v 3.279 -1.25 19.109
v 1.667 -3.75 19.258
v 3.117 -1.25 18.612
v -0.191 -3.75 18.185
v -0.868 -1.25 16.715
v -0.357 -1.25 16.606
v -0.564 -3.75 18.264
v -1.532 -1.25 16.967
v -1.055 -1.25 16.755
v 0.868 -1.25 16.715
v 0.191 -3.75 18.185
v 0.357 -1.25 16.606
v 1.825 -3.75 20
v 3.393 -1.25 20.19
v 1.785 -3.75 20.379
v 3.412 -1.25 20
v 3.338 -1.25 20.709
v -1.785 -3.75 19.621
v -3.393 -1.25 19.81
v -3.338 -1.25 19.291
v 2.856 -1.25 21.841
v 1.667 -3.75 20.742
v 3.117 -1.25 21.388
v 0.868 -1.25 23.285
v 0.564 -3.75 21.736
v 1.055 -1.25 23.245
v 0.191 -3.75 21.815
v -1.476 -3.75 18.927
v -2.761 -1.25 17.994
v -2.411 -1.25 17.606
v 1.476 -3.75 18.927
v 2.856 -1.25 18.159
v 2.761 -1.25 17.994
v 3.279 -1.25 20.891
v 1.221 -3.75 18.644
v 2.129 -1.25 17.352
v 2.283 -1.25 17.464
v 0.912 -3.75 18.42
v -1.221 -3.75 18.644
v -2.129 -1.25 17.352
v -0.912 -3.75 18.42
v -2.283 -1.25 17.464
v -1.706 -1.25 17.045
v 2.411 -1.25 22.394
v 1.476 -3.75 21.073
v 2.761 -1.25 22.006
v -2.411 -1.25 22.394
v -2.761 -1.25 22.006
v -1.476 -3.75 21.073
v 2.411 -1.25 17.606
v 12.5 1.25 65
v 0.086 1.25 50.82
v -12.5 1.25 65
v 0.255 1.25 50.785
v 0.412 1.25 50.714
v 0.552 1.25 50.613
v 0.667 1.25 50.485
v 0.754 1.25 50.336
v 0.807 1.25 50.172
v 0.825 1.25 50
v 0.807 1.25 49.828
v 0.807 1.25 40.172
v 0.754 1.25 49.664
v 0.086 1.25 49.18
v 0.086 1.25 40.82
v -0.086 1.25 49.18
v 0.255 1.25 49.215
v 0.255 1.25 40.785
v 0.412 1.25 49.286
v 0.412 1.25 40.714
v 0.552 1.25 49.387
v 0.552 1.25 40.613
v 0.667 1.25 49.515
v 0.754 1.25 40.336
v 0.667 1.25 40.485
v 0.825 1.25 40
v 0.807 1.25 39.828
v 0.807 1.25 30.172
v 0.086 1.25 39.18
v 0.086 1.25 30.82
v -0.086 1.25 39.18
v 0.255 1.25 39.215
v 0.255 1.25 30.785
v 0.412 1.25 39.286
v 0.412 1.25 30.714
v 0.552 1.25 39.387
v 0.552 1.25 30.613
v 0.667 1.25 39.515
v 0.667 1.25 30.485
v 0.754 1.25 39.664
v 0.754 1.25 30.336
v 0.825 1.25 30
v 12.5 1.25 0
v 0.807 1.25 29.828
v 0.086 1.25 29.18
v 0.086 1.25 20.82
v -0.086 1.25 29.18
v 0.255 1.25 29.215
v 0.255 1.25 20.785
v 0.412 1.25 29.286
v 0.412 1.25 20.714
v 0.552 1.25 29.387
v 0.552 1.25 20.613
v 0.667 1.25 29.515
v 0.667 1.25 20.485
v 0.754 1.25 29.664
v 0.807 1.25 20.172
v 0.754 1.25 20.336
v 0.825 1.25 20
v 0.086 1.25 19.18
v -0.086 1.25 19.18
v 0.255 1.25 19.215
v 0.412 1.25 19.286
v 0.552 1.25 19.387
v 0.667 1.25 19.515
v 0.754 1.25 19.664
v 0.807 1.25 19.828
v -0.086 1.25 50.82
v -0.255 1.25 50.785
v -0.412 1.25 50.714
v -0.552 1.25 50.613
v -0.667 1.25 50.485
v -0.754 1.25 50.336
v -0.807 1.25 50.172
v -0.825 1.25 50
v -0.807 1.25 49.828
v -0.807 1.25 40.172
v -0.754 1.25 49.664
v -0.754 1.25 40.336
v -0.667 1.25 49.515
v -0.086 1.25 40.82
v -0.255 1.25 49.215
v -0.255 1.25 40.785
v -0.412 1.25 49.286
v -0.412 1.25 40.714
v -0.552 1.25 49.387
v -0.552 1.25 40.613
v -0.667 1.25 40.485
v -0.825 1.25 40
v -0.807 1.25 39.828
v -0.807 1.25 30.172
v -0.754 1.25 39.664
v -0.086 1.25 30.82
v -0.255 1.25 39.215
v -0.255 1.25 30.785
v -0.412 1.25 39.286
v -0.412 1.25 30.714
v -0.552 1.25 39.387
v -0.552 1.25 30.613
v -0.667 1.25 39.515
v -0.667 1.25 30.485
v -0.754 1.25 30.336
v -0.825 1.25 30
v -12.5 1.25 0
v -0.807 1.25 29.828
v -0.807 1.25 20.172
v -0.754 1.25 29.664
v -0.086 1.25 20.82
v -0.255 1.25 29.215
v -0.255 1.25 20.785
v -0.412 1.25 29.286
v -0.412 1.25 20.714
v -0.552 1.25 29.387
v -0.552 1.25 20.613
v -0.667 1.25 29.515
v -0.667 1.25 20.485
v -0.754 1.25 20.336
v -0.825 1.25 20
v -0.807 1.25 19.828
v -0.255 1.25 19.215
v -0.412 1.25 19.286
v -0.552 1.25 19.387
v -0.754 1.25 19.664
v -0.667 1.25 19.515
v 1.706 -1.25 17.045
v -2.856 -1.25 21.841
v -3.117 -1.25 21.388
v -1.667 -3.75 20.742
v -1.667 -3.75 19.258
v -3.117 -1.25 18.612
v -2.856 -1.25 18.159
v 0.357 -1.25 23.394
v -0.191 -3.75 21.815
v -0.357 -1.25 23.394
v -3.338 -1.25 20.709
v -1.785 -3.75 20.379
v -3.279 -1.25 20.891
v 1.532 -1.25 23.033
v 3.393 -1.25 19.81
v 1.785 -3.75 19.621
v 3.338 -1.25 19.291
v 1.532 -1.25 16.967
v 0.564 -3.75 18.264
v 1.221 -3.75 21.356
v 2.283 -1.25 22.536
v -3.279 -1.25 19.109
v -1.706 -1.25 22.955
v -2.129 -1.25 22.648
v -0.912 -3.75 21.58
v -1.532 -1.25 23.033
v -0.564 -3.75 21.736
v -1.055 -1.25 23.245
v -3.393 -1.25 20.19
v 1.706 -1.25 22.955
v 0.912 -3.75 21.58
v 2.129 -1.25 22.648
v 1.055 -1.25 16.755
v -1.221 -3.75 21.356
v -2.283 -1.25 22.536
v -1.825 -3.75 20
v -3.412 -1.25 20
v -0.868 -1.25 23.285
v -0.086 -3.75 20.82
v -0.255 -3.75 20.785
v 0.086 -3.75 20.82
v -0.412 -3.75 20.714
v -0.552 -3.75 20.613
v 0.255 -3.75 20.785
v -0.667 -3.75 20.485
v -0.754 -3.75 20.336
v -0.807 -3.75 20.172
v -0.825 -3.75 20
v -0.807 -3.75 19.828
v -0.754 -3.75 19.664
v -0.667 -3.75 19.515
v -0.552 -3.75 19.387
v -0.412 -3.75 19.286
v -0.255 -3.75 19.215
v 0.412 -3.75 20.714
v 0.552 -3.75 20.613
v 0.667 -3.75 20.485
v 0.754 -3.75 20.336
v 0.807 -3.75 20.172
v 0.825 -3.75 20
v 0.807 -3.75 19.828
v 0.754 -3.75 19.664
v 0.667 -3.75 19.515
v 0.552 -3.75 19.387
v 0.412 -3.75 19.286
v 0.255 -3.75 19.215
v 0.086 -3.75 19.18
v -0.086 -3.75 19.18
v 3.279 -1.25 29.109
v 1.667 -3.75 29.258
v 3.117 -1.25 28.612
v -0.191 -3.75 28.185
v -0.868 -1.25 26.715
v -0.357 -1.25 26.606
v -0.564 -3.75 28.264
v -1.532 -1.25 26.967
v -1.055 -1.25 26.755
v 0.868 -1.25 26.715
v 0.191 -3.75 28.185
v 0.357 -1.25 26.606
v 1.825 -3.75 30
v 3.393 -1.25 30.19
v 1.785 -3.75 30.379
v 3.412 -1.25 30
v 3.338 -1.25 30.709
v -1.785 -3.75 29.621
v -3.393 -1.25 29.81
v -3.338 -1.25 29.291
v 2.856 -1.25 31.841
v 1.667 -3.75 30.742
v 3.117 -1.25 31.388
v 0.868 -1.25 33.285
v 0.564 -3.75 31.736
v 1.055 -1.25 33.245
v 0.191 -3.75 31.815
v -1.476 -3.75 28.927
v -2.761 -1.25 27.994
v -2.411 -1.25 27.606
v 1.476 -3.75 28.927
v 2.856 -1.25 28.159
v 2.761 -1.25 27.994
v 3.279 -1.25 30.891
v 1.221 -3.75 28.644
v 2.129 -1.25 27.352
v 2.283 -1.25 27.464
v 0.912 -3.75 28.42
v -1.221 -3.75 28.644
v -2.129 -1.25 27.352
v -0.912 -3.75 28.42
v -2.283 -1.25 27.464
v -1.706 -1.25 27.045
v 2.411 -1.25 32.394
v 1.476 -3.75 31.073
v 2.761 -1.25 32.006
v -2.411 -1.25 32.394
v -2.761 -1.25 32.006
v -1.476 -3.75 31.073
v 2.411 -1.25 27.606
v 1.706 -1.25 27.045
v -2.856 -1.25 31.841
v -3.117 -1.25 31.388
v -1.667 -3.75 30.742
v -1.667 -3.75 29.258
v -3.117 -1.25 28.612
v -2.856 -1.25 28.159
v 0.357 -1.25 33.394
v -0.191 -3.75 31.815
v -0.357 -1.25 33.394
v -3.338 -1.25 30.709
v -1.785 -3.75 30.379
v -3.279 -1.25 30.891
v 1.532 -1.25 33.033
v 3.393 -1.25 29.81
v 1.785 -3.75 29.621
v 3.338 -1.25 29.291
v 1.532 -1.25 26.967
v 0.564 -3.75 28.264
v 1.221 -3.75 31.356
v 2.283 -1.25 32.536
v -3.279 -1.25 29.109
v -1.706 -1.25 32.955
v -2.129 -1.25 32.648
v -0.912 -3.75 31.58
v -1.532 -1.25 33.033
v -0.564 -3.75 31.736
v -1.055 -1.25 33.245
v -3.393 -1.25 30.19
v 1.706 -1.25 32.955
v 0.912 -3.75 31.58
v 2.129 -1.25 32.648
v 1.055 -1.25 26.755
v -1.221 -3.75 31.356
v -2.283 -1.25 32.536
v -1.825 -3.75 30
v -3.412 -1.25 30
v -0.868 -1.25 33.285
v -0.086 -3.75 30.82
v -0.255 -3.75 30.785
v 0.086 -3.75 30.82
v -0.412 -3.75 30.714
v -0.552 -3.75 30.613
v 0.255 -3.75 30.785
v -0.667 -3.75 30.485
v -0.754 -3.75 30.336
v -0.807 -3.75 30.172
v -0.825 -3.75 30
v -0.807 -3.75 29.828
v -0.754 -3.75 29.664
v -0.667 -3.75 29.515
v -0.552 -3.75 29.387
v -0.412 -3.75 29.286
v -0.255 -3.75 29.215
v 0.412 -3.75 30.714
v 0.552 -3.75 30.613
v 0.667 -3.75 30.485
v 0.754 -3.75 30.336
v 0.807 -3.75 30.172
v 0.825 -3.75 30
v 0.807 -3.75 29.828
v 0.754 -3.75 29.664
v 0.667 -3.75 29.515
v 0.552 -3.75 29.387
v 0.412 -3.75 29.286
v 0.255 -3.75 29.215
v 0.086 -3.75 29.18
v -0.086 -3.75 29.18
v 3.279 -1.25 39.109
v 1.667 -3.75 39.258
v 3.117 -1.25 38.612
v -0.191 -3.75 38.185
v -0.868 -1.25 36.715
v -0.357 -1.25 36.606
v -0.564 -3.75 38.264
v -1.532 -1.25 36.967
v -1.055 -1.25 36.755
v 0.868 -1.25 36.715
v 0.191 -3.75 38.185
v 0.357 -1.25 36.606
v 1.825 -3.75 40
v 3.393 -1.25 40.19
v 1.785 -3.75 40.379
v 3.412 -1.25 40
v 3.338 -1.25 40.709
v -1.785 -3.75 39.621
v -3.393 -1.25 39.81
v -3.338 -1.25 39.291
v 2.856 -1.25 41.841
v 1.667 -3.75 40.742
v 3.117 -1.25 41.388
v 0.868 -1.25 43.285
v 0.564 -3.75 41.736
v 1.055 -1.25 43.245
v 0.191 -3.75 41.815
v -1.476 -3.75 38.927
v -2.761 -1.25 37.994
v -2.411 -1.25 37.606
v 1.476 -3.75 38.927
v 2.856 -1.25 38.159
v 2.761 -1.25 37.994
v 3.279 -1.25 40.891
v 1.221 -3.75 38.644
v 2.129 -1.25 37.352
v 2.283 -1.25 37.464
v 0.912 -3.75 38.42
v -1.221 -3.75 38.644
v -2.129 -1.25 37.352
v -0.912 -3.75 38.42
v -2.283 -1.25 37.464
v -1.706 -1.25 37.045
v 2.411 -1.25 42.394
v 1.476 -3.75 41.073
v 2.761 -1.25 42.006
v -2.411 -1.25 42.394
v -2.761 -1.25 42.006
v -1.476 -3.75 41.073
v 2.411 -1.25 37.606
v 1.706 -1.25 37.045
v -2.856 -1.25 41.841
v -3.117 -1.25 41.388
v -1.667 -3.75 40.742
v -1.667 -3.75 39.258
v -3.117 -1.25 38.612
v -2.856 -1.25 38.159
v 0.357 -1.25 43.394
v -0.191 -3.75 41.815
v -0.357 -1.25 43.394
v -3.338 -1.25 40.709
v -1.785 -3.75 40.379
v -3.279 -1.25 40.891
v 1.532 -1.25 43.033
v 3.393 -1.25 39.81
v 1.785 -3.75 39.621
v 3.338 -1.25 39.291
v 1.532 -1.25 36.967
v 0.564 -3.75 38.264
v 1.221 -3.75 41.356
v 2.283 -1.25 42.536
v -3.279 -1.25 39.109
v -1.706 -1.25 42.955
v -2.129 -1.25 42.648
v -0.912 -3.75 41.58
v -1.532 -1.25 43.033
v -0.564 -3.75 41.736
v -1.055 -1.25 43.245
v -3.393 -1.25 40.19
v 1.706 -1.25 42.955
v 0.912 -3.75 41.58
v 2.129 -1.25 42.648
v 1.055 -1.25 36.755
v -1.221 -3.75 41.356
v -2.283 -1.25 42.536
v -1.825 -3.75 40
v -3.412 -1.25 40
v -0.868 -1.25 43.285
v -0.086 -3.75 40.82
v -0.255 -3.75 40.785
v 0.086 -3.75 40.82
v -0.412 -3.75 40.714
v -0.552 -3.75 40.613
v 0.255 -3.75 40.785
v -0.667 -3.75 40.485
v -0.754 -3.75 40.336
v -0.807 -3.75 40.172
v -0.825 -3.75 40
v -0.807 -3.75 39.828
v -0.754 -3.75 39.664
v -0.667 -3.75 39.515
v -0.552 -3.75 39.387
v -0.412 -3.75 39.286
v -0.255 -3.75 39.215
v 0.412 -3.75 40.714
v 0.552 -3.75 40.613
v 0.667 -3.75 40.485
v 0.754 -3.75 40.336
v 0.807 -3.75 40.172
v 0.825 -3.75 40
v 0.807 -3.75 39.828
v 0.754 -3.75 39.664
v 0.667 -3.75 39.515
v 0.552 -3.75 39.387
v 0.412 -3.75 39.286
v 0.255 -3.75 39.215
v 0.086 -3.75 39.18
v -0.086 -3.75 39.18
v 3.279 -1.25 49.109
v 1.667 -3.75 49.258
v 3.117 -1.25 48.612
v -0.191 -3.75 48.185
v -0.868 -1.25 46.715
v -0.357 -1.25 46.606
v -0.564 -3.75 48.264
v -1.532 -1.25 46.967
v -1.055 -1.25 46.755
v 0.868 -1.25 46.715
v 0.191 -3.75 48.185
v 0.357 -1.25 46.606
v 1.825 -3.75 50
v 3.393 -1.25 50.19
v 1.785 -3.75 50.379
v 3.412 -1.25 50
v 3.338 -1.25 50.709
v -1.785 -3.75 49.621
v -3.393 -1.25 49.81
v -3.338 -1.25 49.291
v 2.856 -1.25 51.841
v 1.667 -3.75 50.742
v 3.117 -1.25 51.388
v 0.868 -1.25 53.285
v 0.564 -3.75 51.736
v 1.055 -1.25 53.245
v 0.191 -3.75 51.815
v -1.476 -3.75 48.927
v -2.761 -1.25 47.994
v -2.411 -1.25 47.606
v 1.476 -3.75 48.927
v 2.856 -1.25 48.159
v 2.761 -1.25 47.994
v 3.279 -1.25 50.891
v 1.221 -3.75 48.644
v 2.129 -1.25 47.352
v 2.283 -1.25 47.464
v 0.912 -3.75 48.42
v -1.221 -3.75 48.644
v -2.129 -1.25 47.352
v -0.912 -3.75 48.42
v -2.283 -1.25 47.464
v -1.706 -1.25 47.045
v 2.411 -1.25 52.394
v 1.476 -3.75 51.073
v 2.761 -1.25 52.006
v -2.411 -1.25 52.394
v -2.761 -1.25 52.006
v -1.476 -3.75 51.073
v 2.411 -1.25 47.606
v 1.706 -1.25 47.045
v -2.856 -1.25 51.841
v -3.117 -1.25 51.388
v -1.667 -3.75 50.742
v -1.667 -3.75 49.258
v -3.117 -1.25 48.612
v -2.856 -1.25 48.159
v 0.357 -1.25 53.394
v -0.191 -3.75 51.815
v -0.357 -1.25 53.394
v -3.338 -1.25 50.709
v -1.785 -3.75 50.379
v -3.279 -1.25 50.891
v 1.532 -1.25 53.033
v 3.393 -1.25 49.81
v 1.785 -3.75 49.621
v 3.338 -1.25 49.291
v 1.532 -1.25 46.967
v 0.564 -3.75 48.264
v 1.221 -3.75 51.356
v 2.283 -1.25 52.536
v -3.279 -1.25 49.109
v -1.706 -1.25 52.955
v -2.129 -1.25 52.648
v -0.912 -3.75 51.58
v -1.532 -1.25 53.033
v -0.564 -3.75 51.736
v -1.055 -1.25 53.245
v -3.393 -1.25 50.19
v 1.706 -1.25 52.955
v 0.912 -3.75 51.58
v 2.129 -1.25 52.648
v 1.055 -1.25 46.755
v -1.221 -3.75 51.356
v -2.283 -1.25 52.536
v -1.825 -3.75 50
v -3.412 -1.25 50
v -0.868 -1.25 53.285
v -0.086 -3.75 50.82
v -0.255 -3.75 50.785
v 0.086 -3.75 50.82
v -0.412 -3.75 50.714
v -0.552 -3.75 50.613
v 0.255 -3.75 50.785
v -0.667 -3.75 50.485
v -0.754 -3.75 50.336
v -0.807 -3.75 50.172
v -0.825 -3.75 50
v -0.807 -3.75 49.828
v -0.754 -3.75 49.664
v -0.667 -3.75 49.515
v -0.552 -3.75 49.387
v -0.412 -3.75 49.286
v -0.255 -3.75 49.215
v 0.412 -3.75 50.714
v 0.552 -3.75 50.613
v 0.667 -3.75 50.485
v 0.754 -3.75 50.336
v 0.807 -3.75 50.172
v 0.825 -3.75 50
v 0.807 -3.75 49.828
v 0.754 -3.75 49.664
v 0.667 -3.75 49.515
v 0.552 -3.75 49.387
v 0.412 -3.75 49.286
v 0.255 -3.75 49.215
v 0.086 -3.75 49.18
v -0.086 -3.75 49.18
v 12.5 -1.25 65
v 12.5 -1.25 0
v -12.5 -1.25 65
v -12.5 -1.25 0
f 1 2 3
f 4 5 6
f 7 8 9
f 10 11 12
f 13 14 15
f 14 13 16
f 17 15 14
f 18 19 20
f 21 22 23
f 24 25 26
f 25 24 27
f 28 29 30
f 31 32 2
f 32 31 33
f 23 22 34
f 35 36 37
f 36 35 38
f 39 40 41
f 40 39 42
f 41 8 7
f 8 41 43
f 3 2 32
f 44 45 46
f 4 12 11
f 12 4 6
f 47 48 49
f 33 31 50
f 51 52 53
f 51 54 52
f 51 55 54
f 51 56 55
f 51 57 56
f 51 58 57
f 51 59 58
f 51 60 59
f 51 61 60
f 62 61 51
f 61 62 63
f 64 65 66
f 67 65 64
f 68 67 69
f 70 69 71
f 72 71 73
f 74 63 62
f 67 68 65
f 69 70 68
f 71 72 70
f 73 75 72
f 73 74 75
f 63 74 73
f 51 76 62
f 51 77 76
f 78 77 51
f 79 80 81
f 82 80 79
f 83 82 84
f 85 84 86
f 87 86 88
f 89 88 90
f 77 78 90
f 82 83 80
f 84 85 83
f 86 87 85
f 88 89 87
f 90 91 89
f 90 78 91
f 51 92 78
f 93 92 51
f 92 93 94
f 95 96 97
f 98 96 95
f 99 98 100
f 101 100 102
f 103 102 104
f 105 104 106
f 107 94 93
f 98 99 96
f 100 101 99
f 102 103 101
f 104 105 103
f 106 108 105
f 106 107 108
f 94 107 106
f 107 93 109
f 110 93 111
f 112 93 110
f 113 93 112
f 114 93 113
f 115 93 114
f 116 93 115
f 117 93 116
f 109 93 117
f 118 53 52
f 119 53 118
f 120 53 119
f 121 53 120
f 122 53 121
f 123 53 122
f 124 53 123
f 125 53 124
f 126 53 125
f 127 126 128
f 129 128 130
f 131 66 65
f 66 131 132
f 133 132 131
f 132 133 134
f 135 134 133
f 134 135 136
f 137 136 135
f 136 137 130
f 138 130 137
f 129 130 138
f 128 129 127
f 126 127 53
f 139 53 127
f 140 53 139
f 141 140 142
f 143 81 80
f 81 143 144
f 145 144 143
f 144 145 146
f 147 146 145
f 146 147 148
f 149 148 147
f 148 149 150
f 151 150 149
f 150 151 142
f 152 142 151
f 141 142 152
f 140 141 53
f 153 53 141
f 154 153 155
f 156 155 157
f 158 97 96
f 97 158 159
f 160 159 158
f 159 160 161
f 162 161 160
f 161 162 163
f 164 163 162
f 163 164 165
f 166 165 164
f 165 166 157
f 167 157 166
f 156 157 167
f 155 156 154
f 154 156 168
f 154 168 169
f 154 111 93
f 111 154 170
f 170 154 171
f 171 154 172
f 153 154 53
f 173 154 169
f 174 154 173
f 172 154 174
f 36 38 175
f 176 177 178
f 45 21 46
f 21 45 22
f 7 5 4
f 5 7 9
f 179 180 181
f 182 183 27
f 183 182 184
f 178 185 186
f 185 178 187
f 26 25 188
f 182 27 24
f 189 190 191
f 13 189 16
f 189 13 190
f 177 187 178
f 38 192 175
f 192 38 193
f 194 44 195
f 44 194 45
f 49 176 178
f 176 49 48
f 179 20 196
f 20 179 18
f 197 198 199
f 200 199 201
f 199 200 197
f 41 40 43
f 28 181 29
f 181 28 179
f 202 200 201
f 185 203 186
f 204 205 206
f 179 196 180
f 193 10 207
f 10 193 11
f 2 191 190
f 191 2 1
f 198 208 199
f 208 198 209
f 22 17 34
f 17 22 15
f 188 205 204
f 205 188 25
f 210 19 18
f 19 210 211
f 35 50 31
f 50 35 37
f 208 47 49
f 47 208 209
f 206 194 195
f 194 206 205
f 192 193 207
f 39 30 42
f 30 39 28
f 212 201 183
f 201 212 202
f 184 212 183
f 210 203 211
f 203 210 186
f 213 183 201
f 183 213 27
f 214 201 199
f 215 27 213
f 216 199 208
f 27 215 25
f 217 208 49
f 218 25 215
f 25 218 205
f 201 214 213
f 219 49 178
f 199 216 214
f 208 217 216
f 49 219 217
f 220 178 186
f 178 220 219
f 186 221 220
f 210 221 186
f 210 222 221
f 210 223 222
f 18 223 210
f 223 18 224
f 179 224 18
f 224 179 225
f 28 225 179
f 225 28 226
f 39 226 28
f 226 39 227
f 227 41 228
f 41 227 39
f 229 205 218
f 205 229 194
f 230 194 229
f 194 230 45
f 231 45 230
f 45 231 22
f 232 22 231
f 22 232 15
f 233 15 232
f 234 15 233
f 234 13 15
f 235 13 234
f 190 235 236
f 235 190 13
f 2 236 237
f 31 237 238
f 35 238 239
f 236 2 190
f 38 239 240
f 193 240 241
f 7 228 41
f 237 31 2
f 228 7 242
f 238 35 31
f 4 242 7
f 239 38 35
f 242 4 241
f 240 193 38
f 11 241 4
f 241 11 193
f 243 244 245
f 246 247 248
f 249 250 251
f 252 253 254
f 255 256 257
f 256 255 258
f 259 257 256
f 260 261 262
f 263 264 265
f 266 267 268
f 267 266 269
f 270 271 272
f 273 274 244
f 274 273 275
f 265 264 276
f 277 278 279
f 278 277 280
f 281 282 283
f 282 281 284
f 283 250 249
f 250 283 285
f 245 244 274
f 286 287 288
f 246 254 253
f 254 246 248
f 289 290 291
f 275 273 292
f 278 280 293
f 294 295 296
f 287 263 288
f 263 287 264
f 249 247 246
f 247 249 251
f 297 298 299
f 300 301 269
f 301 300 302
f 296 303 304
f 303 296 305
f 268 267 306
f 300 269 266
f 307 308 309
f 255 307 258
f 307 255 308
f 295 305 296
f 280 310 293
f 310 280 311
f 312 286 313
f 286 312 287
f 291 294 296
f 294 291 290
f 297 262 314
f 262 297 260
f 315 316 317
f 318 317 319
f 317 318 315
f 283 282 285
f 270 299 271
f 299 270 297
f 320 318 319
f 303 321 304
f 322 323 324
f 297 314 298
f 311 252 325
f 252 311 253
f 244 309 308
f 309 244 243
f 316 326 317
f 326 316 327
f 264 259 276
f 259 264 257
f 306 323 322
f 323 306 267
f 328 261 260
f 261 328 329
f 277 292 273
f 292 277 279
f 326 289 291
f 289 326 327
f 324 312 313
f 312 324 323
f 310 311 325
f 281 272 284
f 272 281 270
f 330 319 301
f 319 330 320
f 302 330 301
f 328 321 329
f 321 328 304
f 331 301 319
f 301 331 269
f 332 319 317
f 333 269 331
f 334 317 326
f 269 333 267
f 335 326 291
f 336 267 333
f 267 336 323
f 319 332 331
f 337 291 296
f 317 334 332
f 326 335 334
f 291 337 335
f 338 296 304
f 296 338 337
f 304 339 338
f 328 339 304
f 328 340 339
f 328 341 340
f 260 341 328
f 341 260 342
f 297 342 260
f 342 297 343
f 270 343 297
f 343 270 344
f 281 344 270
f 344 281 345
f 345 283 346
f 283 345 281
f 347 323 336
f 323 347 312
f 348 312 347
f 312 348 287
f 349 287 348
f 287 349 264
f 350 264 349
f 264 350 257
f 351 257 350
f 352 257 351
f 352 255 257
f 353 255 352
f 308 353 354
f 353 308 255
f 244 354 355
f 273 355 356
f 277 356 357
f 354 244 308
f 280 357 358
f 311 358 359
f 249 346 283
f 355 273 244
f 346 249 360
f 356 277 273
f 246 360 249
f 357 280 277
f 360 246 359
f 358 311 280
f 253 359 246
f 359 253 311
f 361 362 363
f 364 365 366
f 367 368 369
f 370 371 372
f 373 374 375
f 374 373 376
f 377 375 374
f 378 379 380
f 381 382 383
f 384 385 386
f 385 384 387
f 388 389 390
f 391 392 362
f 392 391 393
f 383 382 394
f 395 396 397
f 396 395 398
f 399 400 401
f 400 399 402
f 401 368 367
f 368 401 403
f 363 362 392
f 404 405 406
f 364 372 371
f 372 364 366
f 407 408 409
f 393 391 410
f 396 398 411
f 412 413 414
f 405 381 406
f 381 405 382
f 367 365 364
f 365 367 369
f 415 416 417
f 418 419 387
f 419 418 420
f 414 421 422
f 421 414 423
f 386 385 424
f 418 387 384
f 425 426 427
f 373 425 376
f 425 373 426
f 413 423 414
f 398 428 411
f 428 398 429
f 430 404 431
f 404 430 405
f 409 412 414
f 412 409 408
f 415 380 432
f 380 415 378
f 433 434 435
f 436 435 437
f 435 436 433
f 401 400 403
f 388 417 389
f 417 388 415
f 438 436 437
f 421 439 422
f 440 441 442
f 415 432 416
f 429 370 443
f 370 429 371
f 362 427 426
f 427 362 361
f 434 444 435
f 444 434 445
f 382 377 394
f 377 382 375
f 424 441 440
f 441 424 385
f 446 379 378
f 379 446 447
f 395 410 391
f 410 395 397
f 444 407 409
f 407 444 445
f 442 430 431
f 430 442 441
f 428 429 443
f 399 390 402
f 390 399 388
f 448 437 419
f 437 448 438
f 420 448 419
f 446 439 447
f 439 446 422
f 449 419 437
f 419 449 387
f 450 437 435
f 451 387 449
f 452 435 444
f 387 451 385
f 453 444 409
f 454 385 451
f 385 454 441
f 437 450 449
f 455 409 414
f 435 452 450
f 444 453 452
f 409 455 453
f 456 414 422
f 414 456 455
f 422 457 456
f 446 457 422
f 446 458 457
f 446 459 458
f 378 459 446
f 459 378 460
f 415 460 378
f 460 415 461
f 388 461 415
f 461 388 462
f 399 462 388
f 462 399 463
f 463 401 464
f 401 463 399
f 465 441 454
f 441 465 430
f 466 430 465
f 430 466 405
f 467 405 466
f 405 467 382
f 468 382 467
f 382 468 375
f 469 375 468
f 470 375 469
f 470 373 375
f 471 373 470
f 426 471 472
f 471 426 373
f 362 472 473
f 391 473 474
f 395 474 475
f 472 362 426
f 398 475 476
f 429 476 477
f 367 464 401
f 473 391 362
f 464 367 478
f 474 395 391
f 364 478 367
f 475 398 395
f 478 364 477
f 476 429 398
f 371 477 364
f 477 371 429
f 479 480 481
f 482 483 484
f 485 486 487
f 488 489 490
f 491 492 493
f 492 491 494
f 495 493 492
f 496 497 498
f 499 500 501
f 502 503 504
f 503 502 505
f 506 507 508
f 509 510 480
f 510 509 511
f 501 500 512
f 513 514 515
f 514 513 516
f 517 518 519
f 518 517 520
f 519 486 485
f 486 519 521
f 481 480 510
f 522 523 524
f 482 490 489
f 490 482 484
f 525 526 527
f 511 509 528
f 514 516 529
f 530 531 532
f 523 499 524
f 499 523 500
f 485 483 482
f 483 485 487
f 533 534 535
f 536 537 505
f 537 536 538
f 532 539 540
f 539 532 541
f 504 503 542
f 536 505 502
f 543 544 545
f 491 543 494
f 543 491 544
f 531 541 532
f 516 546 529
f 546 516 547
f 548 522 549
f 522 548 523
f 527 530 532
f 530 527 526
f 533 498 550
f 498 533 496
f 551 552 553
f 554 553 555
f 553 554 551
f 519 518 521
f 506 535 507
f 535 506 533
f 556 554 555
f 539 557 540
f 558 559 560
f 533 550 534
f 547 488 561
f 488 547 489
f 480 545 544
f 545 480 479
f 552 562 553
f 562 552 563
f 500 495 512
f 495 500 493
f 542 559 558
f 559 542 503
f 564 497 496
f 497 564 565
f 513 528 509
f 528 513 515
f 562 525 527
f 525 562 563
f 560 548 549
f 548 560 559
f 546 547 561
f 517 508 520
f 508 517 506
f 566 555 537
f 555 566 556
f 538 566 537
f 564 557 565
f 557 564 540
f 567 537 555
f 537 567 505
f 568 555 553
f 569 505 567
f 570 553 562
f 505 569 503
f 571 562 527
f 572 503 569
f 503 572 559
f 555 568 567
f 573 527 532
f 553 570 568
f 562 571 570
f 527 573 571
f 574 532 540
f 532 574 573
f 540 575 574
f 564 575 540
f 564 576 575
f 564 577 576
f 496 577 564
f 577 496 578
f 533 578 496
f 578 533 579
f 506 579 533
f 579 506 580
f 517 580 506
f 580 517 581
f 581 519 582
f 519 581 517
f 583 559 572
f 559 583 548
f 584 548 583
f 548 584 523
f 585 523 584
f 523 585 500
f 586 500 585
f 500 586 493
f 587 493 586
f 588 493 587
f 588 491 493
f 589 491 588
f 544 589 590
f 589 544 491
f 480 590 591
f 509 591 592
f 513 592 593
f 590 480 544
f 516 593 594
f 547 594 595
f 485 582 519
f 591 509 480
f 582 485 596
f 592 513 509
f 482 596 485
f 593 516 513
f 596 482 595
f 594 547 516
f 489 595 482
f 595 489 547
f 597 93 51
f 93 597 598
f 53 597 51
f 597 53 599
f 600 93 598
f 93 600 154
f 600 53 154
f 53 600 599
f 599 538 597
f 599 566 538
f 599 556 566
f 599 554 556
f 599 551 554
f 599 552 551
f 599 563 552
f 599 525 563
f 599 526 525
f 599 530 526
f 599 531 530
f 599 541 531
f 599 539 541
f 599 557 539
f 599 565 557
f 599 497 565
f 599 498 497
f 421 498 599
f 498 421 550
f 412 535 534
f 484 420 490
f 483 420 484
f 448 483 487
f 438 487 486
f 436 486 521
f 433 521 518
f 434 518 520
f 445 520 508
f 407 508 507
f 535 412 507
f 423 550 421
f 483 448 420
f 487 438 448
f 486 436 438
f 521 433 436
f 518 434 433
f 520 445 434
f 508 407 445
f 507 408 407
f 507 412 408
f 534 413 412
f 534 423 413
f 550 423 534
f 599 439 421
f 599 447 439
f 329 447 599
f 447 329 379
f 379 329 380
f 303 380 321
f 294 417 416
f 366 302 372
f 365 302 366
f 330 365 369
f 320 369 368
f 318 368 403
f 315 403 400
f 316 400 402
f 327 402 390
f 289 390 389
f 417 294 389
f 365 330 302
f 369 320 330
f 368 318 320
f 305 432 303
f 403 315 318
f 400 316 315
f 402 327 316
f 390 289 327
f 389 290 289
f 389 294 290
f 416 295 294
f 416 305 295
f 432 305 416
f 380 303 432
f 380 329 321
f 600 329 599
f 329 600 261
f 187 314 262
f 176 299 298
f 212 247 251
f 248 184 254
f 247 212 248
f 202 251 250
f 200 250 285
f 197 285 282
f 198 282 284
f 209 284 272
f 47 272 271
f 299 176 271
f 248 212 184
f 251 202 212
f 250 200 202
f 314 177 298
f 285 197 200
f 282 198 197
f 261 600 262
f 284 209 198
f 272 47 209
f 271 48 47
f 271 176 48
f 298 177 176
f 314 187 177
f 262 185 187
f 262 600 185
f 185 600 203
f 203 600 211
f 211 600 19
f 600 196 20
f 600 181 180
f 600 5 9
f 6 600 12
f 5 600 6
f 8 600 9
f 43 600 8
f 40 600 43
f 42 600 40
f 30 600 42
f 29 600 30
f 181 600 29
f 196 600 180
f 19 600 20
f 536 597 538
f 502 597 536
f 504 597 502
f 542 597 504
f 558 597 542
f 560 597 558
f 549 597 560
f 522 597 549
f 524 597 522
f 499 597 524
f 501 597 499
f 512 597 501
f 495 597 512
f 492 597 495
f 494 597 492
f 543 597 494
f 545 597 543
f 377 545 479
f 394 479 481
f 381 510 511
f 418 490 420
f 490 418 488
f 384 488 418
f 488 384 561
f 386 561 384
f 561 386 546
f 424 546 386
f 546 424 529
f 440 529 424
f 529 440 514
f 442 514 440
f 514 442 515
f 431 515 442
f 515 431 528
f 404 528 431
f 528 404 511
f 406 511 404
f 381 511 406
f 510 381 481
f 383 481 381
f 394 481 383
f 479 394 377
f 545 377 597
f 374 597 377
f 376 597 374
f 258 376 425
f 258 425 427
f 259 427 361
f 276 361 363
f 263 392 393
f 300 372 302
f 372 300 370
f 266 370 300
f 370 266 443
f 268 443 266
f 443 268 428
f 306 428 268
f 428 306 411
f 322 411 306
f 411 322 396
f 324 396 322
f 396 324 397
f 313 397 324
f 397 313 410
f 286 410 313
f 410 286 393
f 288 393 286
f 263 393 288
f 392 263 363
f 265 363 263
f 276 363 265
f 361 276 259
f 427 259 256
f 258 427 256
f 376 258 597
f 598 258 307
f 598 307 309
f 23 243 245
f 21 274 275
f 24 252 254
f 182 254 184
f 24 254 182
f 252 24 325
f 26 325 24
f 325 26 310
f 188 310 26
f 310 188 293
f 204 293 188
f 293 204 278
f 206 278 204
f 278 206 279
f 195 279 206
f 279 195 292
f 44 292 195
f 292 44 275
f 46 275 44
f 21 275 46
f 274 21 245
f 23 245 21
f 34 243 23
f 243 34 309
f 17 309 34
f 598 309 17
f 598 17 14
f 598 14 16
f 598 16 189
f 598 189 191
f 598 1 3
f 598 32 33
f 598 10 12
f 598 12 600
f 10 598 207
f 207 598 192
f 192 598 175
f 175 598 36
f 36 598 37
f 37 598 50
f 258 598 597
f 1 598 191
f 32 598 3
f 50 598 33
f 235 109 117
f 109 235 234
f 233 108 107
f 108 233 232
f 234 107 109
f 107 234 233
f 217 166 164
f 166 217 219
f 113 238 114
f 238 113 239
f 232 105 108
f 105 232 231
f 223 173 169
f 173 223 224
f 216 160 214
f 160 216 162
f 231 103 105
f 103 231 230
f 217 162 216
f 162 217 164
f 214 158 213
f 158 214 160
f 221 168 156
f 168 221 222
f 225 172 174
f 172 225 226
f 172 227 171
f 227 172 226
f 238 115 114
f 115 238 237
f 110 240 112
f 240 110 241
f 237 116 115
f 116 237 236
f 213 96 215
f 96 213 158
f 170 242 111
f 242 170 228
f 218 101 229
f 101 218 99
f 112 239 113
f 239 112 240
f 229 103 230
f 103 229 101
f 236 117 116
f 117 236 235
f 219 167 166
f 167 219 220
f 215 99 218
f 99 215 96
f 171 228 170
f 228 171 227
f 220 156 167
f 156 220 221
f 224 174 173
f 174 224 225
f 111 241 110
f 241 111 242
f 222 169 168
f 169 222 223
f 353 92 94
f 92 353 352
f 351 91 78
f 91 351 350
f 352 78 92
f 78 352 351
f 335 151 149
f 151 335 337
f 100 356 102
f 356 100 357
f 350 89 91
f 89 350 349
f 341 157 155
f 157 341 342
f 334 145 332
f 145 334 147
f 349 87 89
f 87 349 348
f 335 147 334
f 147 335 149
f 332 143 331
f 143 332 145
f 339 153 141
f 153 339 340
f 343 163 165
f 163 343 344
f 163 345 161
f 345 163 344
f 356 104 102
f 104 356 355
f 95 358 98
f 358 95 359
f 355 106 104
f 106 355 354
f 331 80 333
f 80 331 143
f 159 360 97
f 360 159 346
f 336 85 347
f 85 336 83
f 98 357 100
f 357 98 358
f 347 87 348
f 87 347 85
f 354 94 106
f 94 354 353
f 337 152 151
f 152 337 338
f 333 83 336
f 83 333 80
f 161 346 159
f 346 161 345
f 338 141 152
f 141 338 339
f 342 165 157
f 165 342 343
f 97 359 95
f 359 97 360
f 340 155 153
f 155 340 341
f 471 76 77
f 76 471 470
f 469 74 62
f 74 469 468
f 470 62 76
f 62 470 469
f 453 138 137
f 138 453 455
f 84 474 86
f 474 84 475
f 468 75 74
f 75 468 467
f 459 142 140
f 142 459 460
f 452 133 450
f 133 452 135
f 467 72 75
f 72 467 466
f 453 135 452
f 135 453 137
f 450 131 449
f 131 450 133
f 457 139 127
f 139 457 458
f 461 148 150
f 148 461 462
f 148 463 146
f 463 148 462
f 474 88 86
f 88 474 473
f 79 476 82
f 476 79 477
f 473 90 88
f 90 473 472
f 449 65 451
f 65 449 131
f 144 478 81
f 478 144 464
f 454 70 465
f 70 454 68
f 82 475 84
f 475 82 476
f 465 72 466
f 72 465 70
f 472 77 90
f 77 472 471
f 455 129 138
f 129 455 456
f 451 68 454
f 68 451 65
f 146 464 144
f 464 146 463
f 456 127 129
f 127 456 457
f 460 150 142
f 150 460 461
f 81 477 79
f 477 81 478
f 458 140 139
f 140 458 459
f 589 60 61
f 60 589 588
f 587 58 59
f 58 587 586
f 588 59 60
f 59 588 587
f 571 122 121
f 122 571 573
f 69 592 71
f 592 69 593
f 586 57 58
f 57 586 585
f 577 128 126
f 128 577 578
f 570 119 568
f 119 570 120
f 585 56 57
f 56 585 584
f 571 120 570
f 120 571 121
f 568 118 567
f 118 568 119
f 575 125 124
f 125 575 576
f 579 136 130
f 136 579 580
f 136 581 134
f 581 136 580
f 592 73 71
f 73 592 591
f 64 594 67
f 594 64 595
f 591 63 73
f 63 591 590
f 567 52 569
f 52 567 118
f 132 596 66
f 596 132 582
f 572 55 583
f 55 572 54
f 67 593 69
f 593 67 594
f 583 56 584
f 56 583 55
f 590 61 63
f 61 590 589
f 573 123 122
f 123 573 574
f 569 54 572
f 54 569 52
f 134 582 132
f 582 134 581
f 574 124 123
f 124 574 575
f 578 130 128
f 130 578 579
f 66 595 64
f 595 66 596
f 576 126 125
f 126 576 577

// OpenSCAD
extrusion     = 40;        // 40mm x 40mm
tolerance     = 0.00;      // 0.75mm in each direction
corner_radius = 2.5;
scale_factor  = (extrusion + 2.0 * tolerance) / extrusion;  // careful!  We are adopting extrusion_scale from config.scad in the metric-cerberus project.  extrusion_scale=1.02 currently


// Scale this due to the scaled up cut-out for the extrusion
guide_thickness = (2.5 - (extrusion / 2.0 * (scale_factor - 1.0)));   // mm


guide_length    =  65.0;   // mm
guide_width     =  25.0;   // mm
guide_hole_size =   1.65;   // mm *diameter* 
guide_hole_offsets   = [ 20.0, 30.0, 40.0, 50.0 ];  // mm
guide_support_radius = (8.0 + 2.0) / 2.0; // mm


translate([0, 0, 0]) difference () {
            union () {
                translate([0, 0, guide_length / 2.0])
                cube([guide_width, guide_thickness, guide_length], center=true);
                
                // add some extra support
                for (offset = guide_hole_offsets) {
                        translate([0, - guide_thickness / 2.0, offset])
                        rotate ([90, 0, 0])
                        cylinder(h = guide_thickness * 2.0, r1 = guide_support_radius, r2 = guide_hole_size / 2.0 + 1.0, $fn = 30, center=true);
                        
                }
            }
            // drill some holes
            for (offset = guide_hole_offsets) {
                translate([0, 0, offset])
                rotate ([90, 0, 0])
                cylinder(h = guide_thickness * (1.0 + 2.0), r = guide_hole_size / 2.0, $fn = 30, center=true);
            }
        }
